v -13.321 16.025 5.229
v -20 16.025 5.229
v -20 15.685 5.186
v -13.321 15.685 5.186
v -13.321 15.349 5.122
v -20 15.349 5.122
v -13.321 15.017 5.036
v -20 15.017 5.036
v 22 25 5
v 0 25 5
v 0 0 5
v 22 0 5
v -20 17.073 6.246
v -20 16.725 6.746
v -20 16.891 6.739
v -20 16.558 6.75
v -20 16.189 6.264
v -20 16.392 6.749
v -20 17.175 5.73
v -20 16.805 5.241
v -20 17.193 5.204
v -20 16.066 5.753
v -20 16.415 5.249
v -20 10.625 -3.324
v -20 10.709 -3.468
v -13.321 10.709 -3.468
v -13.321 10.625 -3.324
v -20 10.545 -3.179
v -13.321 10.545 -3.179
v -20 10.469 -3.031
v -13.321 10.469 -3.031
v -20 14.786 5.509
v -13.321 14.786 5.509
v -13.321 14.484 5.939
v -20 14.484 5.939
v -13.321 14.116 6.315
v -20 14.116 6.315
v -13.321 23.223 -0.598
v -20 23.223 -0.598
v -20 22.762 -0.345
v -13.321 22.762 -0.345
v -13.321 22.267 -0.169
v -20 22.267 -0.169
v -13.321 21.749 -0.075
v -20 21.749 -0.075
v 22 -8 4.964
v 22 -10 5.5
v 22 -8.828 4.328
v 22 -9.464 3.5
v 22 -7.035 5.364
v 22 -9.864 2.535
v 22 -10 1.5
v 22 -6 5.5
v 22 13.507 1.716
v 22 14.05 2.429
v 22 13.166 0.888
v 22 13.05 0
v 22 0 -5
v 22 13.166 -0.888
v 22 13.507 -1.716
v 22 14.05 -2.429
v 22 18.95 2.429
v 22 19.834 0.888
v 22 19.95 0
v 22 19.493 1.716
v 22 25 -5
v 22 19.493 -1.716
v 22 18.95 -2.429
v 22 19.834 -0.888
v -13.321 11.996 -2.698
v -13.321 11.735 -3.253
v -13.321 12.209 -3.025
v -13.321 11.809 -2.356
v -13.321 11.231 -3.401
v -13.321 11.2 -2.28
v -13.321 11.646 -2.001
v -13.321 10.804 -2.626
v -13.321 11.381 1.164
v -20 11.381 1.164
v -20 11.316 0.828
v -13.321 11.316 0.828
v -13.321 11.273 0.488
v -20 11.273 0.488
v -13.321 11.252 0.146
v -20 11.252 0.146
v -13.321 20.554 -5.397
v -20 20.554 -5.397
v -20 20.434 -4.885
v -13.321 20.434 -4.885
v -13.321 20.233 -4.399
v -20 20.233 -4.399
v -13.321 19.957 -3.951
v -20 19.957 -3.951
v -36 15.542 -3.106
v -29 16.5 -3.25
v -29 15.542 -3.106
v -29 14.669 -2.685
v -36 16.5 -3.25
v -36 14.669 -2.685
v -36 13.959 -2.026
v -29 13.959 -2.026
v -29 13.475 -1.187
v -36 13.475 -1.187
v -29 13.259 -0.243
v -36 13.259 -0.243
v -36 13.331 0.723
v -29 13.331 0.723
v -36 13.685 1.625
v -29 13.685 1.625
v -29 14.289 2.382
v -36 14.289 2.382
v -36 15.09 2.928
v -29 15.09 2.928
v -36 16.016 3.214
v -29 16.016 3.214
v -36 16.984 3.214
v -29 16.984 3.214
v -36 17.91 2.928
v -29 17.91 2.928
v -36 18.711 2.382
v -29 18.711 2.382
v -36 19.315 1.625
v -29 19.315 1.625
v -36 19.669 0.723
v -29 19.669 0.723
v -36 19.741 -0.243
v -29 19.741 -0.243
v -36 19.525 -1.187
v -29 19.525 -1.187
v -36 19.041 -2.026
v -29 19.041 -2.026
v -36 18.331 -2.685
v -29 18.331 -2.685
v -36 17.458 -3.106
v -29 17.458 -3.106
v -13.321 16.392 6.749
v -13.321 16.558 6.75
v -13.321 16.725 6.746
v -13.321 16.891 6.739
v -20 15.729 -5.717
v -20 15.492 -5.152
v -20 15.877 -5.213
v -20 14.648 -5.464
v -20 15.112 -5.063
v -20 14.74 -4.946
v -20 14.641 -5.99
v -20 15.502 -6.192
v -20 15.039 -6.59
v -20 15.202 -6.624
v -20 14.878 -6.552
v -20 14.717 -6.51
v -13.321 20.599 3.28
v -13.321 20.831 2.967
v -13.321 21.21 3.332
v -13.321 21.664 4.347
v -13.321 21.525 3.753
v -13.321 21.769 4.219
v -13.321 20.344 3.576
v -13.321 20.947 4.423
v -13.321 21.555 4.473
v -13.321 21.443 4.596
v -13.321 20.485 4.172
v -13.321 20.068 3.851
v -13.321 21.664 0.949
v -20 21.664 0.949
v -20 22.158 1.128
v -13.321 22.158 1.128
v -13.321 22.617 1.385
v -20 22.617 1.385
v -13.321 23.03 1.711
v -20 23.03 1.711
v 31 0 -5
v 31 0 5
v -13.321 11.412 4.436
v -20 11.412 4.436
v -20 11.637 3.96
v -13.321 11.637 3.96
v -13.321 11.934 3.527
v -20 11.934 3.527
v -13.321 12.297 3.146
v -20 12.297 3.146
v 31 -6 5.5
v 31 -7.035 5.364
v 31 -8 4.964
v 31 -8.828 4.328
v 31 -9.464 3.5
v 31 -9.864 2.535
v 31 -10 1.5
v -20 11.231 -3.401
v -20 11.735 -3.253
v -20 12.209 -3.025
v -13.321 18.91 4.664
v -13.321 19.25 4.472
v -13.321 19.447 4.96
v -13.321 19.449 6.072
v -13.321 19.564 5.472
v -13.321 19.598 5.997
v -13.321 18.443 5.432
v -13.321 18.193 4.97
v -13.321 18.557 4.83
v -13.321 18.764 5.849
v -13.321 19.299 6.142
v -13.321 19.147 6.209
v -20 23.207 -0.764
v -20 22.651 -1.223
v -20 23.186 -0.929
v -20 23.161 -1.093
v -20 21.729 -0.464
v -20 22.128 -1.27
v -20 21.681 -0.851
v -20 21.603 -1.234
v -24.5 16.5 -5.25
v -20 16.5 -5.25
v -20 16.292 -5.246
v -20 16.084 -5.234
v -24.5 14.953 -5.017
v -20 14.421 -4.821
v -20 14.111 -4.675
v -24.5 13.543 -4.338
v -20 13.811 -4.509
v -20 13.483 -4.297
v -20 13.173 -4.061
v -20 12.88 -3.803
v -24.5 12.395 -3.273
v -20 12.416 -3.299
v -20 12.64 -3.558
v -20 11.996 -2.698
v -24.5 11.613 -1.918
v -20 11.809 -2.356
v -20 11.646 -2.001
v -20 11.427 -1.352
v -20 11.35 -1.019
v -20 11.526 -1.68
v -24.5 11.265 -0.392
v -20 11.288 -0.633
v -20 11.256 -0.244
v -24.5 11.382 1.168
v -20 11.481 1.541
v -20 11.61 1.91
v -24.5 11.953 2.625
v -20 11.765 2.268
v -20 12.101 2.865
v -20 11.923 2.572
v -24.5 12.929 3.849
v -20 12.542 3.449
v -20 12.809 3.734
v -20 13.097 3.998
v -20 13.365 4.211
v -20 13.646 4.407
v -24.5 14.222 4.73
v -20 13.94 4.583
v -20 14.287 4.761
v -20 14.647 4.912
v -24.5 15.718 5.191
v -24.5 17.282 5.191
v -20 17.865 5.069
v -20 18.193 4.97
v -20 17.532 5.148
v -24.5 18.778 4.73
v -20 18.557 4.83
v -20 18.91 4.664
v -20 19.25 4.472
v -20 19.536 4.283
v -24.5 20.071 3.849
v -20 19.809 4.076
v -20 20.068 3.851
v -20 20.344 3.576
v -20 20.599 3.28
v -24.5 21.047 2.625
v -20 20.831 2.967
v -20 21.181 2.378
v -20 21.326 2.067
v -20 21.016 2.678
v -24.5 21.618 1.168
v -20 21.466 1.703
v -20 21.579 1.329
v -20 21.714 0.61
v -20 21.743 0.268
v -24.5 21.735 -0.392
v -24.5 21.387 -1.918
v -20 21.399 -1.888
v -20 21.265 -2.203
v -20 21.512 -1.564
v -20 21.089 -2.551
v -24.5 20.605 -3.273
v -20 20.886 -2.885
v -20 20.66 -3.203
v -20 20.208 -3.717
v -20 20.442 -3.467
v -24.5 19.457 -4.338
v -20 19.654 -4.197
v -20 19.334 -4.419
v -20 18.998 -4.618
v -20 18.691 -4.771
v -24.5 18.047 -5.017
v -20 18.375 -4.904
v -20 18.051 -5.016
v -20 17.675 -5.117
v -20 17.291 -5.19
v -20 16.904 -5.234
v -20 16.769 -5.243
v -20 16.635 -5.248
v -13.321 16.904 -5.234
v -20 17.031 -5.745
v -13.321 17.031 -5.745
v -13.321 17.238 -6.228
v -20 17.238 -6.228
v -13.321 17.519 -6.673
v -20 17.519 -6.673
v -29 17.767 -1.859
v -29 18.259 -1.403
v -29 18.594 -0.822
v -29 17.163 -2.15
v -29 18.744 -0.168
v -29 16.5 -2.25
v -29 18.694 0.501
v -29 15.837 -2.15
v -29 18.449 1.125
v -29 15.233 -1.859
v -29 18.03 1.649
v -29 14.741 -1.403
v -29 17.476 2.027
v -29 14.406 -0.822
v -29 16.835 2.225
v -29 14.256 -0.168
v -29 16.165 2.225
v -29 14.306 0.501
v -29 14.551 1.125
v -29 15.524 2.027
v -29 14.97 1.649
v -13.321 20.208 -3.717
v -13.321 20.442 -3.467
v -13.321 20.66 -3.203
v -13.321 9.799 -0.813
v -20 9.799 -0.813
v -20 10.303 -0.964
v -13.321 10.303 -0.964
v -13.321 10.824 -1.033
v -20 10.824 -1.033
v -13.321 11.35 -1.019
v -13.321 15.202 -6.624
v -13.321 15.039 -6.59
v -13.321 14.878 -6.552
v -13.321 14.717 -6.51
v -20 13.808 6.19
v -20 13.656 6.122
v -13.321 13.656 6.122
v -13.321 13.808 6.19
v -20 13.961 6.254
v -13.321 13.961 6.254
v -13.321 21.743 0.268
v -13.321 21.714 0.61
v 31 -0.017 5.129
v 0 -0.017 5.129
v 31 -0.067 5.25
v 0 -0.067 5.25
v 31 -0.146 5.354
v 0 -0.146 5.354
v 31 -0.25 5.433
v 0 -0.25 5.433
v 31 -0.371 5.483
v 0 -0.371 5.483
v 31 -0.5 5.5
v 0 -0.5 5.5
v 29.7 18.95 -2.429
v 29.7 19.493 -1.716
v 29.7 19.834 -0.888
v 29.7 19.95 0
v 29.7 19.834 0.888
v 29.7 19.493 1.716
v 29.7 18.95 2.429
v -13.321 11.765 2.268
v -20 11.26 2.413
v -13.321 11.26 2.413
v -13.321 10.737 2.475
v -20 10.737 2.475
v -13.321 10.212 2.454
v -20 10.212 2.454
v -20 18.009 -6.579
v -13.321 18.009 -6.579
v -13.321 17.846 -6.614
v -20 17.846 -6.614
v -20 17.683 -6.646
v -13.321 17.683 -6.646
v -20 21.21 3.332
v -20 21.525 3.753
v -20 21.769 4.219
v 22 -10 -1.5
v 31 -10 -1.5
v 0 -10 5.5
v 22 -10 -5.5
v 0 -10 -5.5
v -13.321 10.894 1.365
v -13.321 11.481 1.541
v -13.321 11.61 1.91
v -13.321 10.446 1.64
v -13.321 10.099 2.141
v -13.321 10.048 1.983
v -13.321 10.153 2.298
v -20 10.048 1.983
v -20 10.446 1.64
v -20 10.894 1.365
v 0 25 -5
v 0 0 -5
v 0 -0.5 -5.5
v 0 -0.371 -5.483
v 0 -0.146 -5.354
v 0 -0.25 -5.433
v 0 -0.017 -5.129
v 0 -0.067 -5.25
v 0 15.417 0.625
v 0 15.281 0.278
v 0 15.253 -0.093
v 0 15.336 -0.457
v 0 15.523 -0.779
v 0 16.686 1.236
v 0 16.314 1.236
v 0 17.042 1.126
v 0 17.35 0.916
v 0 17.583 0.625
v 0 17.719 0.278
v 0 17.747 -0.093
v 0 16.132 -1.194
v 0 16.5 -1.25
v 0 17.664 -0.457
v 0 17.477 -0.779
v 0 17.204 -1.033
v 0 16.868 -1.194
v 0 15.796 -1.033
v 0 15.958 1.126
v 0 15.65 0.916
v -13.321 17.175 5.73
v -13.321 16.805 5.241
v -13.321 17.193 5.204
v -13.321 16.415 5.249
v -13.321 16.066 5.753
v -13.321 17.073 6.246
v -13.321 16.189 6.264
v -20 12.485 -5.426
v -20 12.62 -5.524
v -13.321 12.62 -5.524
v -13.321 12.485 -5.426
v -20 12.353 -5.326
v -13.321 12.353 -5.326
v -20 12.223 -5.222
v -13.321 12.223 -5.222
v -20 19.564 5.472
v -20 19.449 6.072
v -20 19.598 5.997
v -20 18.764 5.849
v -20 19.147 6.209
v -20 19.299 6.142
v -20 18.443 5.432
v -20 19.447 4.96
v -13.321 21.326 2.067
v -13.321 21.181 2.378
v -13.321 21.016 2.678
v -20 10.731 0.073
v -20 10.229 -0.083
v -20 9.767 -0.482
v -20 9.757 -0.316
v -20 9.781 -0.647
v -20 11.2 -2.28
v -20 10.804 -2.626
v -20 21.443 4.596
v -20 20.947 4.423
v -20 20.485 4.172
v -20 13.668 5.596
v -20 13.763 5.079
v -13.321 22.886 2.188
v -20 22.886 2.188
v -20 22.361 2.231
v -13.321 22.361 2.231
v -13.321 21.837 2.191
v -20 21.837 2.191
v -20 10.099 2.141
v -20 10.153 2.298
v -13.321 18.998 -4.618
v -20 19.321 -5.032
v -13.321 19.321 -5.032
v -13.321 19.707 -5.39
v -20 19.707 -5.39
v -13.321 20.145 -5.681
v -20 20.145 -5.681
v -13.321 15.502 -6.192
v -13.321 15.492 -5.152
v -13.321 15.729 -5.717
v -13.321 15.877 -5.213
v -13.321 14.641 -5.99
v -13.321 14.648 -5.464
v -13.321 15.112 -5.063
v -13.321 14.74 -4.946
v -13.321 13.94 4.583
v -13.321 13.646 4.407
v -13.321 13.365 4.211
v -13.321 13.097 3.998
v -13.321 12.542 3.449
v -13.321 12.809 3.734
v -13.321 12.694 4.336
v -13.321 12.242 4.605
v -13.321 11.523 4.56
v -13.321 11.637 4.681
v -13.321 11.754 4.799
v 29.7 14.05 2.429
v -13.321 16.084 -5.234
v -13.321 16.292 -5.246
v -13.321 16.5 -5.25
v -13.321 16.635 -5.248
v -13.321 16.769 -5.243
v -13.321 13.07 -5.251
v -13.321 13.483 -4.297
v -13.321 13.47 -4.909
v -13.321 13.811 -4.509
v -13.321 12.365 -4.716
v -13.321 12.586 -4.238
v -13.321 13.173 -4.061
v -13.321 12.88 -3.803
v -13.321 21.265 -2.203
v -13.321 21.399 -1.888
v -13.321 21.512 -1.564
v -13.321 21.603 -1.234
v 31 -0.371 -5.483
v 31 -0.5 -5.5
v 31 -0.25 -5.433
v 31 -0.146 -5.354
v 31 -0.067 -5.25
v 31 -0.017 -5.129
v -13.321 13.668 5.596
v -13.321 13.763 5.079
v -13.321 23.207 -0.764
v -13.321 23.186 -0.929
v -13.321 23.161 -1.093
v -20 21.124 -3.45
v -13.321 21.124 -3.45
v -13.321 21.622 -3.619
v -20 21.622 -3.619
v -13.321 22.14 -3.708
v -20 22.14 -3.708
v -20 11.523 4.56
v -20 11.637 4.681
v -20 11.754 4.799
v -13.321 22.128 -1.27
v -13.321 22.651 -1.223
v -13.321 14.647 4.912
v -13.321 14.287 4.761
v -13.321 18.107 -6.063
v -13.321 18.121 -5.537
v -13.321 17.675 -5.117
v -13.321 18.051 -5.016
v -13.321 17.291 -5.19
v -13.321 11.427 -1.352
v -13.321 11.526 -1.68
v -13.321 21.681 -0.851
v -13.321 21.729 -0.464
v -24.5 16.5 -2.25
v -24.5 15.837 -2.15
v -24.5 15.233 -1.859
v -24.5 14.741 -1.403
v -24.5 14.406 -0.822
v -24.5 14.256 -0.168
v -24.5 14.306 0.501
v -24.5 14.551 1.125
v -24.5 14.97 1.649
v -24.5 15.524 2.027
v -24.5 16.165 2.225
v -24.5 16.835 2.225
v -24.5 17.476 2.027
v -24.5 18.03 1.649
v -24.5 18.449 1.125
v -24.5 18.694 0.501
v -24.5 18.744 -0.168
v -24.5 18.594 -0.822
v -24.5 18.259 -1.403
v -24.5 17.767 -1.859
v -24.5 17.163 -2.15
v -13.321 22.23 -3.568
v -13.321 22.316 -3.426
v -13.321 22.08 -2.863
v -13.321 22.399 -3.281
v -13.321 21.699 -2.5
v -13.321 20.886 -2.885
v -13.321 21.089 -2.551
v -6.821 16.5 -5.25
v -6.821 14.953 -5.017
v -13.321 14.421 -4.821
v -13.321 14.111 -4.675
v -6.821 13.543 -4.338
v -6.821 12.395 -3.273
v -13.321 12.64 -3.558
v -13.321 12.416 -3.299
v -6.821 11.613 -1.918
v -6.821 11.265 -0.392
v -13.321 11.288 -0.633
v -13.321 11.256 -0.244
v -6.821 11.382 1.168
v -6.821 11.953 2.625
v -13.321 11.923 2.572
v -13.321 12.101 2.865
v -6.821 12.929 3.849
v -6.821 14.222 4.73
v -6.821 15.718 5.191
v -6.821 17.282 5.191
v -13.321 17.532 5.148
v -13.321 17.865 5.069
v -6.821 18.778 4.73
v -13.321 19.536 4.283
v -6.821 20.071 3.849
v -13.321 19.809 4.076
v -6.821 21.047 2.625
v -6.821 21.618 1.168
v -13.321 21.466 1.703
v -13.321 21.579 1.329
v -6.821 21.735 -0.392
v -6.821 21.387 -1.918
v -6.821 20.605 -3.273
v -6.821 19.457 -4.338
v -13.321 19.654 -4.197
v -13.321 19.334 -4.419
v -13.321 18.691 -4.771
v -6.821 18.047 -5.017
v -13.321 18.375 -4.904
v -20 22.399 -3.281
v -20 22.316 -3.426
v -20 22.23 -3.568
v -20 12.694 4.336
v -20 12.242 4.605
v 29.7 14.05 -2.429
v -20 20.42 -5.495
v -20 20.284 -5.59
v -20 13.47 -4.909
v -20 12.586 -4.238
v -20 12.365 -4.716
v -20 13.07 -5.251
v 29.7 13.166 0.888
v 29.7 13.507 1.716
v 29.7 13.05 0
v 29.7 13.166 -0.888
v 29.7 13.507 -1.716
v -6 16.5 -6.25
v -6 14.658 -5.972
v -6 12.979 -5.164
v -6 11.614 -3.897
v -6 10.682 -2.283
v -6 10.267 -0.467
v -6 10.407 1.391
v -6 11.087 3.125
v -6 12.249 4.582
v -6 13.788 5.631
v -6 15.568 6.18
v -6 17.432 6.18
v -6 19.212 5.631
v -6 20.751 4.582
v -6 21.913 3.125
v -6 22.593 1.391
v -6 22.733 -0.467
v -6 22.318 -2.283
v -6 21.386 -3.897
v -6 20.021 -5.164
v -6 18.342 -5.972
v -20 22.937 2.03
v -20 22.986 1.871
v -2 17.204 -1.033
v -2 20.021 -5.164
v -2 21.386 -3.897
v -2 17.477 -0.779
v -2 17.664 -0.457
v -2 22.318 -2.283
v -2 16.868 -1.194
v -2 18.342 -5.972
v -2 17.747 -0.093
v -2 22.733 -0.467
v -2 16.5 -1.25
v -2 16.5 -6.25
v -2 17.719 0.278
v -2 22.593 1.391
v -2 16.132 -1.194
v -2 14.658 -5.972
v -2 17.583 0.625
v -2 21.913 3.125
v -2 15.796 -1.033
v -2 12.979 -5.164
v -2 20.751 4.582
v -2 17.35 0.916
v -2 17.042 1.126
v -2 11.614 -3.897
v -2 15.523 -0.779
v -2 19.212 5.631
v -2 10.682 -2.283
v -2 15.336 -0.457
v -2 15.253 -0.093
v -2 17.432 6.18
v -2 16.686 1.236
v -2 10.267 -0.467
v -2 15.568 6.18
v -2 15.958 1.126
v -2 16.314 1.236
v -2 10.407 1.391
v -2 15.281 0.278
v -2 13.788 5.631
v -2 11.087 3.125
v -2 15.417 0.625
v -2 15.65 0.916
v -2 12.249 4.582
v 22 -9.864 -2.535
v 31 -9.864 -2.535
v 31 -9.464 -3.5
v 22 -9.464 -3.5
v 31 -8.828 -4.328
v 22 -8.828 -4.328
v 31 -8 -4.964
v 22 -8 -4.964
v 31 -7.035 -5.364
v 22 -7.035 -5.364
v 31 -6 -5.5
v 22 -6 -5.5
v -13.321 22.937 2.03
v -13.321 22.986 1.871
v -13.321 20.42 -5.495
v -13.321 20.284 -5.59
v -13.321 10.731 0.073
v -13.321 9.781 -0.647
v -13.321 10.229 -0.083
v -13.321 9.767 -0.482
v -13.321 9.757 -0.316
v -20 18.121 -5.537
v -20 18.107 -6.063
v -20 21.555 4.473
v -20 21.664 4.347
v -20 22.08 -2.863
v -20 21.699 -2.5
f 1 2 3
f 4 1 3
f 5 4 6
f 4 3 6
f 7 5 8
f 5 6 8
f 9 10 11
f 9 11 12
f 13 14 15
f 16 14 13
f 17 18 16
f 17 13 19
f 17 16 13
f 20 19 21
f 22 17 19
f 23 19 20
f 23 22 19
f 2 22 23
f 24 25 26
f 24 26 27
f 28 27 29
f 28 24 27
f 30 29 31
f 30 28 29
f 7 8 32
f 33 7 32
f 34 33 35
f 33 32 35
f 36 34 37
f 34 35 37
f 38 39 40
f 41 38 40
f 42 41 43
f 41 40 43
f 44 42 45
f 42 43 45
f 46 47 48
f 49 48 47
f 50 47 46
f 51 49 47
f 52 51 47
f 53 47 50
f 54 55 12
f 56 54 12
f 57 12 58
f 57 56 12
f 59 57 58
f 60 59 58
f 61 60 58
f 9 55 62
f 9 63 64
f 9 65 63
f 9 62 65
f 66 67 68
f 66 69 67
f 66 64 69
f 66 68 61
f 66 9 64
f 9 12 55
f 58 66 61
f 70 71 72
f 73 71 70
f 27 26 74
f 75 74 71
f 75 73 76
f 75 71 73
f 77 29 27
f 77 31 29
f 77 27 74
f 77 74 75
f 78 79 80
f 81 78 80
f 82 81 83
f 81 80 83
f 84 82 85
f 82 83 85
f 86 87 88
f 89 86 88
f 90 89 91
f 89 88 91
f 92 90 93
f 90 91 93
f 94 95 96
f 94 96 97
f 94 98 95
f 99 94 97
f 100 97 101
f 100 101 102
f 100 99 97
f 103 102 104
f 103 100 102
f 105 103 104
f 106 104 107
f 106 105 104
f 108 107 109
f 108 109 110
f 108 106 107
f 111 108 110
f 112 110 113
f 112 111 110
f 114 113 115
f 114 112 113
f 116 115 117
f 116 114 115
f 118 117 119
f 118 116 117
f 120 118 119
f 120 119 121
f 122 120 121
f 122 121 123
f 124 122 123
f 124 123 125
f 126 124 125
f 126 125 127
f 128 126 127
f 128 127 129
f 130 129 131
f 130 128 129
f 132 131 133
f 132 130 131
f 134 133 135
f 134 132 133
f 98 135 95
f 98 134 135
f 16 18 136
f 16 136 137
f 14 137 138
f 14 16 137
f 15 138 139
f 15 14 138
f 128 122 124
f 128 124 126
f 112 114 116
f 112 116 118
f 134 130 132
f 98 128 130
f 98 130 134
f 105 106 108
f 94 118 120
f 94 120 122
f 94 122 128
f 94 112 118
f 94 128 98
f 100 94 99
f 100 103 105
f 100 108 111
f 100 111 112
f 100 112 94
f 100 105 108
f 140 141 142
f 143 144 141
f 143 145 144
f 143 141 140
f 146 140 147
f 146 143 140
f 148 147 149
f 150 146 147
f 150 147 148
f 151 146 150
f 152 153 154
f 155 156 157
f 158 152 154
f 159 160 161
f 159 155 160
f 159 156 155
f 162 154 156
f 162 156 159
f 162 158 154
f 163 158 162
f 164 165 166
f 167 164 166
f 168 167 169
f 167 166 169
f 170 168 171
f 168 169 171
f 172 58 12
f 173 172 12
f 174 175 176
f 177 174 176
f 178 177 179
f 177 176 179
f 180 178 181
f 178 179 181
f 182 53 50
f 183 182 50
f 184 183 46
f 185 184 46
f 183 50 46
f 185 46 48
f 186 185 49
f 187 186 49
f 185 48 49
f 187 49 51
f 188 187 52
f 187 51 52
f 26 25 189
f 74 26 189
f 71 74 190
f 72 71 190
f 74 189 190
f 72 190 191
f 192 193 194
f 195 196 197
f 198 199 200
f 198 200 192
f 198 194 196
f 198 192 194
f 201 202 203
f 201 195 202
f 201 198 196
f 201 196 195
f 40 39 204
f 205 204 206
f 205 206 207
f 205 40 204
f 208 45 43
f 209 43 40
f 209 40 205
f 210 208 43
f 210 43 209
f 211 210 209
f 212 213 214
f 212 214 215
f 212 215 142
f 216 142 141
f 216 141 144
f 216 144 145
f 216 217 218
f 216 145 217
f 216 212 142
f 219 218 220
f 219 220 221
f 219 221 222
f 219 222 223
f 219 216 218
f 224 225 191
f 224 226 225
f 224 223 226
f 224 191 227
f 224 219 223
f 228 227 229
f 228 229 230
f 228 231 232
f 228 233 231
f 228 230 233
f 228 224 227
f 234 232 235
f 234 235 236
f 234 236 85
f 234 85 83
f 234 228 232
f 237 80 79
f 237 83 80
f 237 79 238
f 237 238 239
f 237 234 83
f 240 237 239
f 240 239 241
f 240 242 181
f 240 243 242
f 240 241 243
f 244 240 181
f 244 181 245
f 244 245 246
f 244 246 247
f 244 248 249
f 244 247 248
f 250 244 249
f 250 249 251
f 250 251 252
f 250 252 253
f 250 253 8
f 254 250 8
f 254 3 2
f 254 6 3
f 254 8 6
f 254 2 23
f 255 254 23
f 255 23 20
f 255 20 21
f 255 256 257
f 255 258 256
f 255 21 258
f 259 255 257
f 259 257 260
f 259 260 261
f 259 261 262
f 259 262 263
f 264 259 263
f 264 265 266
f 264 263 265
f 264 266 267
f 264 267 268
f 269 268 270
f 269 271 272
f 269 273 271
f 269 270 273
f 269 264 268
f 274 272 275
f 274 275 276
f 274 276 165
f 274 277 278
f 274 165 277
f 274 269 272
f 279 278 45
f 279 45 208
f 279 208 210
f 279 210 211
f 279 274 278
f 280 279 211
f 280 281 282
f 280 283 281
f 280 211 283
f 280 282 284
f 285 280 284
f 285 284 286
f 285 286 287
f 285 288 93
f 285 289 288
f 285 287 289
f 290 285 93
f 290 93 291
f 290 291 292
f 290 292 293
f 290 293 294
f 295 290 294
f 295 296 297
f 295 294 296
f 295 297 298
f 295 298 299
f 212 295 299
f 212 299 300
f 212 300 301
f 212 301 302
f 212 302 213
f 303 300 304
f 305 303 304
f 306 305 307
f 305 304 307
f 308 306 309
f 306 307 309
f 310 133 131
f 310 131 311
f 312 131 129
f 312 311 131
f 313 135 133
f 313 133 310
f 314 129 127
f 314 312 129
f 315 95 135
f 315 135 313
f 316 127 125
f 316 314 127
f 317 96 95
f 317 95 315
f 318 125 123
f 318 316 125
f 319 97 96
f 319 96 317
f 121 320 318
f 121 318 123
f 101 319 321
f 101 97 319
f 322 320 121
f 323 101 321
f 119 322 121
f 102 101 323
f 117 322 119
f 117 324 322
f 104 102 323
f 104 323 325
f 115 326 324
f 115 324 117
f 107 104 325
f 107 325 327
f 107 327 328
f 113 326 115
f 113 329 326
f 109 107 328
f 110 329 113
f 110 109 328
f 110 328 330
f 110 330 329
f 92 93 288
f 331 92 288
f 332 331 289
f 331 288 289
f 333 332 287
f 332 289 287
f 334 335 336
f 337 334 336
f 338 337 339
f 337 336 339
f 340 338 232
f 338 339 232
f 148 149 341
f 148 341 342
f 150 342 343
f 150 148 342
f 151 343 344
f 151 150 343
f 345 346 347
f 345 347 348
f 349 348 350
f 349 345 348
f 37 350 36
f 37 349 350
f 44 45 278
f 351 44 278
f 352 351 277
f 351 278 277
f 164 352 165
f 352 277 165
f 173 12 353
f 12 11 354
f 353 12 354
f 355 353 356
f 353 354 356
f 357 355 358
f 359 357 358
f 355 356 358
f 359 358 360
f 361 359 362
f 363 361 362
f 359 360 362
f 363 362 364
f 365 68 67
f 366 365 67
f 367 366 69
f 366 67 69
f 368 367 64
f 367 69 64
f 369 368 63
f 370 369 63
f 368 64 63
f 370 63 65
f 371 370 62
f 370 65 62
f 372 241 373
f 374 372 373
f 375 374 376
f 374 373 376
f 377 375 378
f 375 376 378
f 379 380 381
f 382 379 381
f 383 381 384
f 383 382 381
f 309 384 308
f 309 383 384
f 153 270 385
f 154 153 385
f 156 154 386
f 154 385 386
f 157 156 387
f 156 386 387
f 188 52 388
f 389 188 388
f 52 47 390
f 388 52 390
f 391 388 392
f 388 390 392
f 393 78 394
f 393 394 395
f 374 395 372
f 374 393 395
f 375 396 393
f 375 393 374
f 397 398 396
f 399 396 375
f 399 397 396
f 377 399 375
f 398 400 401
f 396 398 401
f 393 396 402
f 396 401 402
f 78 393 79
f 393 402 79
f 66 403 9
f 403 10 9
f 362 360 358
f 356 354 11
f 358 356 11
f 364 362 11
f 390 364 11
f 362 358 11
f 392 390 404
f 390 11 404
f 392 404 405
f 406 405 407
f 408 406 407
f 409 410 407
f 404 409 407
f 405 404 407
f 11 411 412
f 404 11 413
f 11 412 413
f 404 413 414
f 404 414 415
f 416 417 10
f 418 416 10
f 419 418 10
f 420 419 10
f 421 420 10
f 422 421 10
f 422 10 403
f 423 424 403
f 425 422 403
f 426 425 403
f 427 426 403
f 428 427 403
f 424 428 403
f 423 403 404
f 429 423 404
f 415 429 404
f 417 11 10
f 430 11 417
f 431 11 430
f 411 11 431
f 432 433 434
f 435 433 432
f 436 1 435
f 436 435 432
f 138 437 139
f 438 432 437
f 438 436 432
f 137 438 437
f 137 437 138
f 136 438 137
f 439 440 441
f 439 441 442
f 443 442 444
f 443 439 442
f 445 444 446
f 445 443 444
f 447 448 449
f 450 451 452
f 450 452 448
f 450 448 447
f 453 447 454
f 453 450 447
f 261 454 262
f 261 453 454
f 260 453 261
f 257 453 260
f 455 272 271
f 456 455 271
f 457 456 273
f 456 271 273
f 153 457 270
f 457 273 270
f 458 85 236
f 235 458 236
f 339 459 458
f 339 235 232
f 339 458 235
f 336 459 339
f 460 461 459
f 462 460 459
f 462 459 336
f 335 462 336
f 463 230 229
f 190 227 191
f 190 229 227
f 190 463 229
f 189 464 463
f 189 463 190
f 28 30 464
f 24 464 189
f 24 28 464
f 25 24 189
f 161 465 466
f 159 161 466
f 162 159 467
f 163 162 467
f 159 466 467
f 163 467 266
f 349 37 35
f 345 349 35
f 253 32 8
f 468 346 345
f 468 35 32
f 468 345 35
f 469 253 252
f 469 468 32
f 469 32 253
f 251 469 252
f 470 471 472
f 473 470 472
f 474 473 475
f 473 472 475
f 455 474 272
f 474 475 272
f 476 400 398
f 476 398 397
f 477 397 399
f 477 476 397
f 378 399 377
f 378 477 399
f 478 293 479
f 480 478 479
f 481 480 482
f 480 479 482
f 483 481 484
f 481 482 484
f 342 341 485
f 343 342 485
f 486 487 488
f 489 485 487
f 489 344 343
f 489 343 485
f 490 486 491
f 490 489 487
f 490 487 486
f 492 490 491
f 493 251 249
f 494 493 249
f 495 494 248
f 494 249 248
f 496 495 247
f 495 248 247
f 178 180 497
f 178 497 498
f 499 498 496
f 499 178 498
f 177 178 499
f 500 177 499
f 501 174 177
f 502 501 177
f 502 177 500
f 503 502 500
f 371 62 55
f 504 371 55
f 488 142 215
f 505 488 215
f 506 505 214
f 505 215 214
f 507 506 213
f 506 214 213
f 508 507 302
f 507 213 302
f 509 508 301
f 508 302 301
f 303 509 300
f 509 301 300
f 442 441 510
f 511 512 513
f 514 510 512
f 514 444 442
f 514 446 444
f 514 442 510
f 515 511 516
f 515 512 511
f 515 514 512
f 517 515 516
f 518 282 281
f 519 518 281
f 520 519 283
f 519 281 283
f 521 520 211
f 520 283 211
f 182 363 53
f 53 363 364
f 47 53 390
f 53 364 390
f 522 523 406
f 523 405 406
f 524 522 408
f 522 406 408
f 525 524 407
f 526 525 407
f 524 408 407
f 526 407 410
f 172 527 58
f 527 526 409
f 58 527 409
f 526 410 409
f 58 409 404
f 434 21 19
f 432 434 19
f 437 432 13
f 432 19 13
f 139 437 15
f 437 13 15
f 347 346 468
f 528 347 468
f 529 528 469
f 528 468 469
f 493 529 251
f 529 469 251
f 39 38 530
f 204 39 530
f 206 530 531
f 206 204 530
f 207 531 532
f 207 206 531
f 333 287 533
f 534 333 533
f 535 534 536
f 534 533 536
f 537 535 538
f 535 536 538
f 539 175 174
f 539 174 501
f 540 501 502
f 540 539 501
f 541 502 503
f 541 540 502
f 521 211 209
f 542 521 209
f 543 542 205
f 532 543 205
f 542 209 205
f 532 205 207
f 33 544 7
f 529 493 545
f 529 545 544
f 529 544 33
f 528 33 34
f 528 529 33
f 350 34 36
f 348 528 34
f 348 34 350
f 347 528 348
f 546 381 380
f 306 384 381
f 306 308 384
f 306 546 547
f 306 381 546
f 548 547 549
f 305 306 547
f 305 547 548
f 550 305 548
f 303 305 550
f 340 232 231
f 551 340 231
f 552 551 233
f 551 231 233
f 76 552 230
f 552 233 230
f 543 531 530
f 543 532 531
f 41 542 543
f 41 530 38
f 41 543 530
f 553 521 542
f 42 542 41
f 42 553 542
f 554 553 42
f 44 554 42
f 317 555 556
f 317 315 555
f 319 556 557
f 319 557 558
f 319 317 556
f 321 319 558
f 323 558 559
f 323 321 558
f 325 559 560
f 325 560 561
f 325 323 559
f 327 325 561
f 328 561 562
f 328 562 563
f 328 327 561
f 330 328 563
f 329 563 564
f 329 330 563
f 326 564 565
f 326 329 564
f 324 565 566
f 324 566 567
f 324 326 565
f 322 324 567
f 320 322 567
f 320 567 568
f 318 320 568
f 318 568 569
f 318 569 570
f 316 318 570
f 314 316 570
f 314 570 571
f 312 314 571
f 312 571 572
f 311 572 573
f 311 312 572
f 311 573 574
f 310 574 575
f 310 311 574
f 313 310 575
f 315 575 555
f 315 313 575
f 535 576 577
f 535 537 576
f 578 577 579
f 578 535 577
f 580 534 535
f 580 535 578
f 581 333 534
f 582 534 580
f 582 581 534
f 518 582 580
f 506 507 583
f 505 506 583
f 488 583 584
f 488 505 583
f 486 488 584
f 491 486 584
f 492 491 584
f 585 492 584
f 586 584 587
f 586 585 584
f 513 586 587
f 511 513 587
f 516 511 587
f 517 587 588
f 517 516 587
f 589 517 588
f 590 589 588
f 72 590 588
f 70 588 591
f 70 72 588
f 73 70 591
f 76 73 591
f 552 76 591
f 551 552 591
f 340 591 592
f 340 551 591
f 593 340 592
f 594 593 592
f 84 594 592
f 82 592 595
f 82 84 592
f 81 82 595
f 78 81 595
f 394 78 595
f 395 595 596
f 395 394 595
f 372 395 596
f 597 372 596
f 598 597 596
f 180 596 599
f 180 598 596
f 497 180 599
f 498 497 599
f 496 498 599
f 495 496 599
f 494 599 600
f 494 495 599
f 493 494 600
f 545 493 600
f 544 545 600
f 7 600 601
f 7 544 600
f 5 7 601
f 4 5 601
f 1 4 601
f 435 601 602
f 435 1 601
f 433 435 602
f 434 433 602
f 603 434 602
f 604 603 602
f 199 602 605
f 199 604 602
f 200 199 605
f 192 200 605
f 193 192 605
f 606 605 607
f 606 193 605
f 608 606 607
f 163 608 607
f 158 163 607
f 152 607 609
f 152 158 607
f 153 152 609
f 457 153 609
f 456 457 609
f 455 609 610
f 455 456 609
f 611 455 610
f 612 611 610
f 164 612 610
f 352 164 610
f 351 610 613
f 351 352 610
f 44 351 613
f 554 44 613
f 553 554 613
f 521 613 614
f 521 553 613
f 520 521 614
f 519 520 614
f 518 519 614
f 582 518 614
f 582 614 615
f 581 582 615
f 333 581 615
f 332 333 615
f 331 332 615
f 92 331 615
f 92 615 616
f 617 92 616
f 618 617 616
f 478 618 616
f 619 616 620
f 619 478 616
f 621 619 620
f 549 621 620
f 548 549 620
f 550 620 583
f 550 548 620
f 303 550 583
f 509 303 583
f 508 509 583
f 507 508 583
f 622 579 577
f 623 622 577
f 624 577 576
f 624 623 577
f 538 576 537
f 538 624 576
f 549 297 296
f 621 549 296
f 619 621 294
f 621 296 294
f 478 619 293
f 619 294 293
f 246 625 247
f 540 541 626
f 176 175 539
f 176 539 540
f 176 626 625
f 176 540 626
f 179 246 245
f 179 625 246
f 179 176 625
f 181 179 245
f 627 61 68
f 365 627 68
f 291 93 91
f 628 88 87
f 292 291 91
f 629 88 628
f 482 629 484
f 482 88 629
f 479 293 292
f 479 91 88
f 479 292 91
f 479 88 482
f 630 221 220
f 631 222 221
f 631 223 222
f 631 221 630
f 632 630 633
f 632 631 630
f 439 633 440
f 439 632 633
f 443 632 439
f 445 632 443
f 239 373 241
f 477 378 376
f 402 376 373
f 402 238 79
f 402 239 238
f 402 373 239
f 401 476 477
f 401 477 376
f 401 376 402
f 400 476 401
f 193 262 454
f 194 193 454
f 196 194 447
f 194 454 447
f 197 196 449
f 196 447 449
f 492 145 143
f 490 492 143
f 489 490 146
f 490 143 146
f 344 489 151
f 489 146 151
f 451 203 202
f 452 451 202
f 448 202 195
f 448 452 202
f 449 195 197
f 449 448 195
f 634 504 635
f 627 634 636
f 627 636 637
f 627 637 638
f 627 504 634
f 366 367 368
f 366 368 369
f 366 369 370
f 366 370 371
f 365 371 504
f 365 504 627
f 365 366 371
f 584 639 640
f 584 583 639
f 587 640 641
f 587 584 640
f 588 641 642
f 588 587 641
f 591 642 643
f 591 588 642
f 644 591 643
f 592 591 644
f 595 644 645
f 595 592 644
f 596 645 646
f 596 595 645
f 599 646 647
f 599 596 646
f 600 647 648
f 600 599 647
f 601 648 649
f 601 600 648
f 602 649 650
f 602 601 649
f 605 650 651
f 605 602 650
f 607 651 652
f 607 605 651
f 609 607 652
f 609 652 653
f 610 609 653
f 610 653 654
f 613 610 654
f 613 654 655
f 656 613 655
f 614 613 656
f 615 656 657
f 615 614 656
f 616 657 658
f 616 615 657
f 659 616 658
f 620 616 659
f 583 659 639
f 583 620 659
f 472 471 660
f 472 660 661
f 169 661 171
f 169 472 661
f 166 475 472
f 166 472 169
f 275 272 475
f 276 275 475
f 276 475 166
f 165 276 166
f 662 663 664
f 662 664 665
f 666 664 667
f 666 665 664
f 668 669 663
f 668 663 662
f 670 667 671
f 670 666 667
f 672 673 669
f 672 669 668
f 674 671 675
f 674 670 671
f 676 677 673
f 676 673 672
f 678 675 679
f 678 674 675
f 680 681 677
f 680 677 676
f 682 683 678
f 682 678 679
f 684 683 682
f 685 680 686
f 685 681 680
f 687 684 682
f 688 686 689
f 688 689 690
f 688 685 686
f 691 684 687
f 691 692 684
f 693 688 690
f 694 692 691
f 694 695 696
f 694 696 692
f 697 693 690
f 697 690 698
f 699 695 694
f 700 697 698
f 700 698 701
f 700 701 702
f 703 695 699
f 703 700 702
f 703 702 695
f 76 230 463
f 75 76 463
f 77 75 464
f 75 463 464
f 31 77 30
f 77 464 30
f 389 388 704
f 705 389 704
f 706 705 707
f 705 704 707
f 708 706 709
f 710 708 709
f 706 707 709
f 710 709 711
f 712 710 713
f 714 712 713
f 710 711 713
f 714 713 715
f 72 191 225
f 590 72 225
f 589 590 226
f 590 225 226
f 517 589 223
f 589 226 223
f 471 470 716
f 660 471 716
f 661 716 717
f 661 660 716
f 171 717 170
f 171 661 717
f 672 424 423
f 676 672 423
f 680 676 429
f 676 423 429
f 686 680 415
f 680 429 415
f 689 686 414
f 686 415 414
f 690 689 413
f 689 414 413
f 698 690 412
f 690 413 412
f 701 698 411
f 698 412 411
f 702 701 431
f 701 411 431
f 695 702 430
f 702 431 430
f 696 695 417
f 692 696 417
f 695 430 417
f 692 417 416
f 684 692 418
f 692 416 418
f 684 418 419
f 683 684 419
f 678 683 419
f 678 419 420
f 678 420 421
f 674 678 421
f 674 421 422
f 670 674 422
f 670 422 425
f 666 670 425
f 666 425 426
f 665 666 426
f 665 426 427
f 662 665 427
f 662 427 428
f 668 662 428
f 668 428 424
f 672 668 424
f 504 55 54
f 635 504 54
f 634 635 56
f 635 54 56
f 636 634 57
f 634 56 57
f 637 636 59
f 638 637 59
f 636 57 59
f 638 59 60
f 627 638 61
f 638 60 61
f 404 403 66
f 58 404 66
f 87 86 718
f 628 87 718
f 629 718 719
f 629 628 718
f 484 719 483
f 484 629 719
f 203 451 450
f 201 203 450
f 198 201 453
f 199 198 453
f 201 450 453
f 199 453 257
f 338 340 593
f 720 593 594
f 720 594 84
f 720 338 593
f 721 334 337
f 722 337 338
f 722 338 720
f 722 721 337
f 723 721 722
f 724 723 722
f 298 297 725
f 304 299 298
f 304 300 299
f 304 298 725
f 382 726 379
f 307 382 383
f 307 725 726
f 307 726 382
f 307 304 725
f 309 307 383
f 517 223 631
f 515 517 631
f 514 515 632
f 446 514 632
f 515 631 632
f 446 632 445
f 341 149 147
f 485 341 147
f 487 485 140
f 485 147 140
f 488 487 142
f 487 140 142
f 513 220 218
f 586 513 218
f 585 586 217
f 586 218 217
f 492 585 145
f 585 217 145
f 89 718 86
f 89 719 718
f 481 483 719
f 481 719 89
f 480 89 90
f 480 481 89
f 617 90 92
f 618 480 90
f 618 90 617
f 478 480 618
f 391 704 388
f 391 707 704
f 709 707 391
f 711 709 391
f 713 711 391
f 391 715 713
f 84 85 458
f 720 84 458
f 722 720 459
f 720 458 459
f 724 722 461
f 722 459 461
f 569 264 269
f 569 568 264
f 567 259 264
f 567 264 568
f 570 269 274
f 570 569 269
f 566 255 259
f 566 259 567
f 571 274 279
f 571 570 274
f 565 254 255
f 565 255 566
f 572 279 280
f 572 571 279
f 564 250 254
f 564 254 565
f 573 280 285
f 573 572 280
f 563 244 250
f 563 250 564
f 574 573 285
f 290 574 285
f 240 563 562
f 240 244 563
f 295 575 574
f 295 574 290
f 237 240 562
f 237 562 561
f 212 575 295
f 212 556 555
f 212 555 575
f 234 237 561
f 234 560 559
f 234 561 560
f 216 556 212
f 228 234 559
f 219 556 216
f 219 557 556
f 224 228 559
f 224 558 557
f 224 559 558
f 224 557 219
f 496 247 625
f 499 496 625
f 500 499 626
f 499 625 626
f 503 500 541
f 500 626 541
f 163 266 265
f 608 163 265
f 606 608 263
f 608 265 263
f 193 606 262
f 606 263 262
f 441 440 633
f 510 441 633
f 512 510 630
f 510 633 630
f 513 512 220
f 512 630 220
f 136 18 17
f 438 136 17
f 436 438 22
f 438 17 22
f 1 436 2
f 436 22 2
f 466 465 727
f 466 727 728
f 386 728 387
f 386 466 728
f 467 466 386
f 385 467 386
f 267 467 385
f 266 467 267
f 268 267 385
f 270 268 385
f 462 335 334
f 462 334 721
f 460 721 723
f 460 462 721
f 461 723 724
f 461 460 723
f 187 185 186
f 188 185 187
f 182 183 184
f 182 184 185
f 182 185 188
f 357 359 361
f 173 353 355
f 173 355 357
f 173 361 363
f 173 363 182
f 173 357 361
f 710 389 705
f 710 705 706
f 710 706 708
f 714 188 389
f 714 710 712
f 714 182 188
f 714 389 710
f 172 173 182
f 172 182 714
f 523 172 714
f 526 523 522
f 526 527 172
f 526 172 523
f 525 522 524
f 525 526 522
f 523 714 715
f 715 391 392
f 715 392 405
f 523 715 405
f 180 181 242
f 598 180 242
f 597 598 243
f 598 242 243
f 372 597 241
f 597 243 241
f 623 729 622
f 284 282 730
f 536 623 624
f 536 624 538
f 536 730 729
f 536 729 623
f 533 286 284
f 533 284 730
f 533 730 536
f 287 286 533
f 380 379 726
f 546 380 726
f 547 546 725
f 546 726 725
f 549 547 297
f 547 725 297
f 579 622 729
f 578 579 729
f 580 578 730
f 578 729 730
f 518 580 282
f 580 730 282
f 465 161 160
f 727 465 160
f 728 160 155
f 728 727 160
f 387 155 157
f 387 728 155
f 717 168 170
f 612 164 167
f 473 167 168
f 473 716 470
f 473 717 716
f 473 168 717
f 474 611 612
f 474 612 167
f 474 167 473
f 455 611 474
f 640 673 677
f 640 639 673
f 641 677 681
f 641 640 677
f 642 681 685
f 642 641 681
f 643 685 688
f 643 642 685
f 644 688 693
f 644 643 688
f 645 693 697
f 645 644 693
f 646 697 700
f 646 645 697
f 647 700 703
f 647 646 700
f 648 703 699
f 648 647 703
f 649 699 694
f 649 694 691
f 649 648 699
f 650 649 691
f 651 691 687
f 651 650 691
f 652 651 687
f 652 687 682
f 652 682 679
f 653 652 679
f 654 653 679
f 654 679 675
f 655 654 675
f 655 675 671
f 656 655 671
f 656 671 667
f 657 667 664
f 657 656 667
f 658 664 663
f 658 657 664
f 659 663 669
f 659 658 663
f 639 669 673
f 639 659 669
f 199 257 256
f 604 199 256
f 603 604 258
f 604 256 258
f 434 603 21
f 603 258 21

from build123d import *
from build123d.topology import SkipClean

# Parameters (mm, degrees)
ESQUISSE1_W             = 22
ESQUISSE1_H             = 25
EXTRUSION1_DEPTH        = 5
EXTRUSION2_DEPTH        = 22
EXTRUSION3_DEPTH        = 9
EXTRUSION4_DEPTH        = 7.7
ESQUISSE6_R             = 1.25
EXTRUSION5_DEPTH        = 36
ENL_V_MAT_EXTRU_2_DEPTH = 6.678544503


with BuildPart() as part:
    # Esquisse1 → Extrusion1 (new, symmetric)
    with BuildSketch(Plane.XY):
        with Locations((11, 12.5)):
            Rectangle(ESQUISSE1_W, ESQUISSE1_H)
    extrude(amount=EXTRUSION1_DEPTH, both=True)

    # Esquisse2 → Extrusion2 (add)
    with BuildSketch(Plane.ZY):
        with BuildLine():
            Line((-5, 0), (5, 0))
            ThreePointArc((5, 0), (5.353553391, -0.146446609), (5.5, -0.5))
            Line((5.5, -0.5), (5.5, -10))
            Line((5.5, -10), (-5.5, -10))
            Line((-5.5, -10), (-5.5, -0.5))
            ThreePointArc((-5.5, -0.5), (-5.353553391, -0.146446609), (-5, 0))
        make_face()
    extrude(amount=-EXTRUSION2_DEPTH)

    # Esquisse4 → Extrusion3 (add)
    with BuildSketch(Plane(origin=(22, 0, 0), x_dir=(0, 0, -1), z_dir=(1, 0, 0))):
        with BuildLine():
            Line((5.5, -6), (5.5, -0.5))
            ThreePointArc((5.5, -0.5), (5.353553391, -0.146446609), (5, 0))
            Line((5, 0), (-5, 0))
            ThreePointArc((-5, 0), (-5.353553391, -0.146446609), (-5.5, -0.5))
            Line((-5.5, -0.5), (-5.5, -6))
            ThreePointArc((-5.5, -6), (-4.328427125, -8.828427125), (-1.5, -10))
            Line((-1.5, -10), (1.5, -10))
            ThreePointArc((1.5, -10), (4.328427125, -8.828427125), (5.5, -6))
        make_face()
    extrude(amount=EXTRUSION3_DEPTH)

    # Esquisse5 → Extrusion4 (add)
    with BuildSketch(Plane(origin=(22, 0, 0), x_dir=(0, 0, -1), z_dir=(1, 0, 0))):
        with BuildLine():
            Line((-2.42899156, 18.95), (-2.42899156, 14.05))
            ThreePointArc((-2.42899156, 14.05), (0, 13.05), (2.42899156, 14.05))
            Line((2.42899156, 14.05), (2.42899156, 18.95))
            ThreePointArc((2.42899156, 18.95), (0, 19.95), (-2.42899156, 18.95))
        make_face()
    extrude(amount=EXTRUSION4_DEPTH)

    # Esquisse6 → Extrusion5 (add)
    with BuildSketch(Plane.ZY):
        with Locations(Location((0, 16.5, 0), (0, 0, 180))):
            Circle(ESQUISSE6_R)
    extrude(amount=EXTRUSION5_DEPTH)

    # Esquisse7 → Révolution1 (revolve)
    with BuildSketch(Plane.XY, mode=Mode.PRIVATE) as r_volution1_sk:
        Polygon((-2, 17.75), (-2, 22.75), (-6, 22.75), (-6.821455497, 21.75), (-13.321455497, 21.75), (-13.321455497, 23.25), (-20, 23.25), (-20, 21.75), (-24.5, 21.75), (-24.5, 18.75), (-29, 18.75), (-29, 19.75), (-36, 19.75), (-36, 17.75), align=None)
    revolve(r_volution1_sk.sketch.rotate(Axis((0, 16.5, 0), (-1, 0, 0)), 90), axis=Axis((0, 16.5, 0), (-1, 0, 0)))

    # Esquisse8 → Enlèv. mat.-Extru.2 (cut)
    with SkipClean():  # the faces are left unmerged after this step: merging them gives an invalid solid
        with BuildSketch(Plane.ZY.offset(20)):
            with BuildLine():
                ThreePointArc((-3.202562433, 20.660059358), (-3.544451524, 21.369801094), (-3.707751714, 22.140485549))
                ThreePointArc((-3.707751714, 22.140485549), (-4.620864959, 21.420376716), (-5.396827126, 20.554227049))
                ThreePointArc((-5.396827126, 20.554227049), (-4.63790237, 20.342910474), (-3.951001573, 19.957178991))
                ThreePointArc((-3.951001573, 19.957178991), (-3.594006079, 20.326959668), (-3.202562433, 20.660059358))
            make_face()
            with BuildLine():
                ThreePointArc((-1.233637785, 21.603002823), (-1.25729104, 22.390442983), (-1.093007579, 23.160918438))
                ThreePointArc((-1.093007579, 23.160918438), (-2.220072686, 22.874462901), (-3.281244207, 22.398808054))
                ThreePointArc((-3.281244207, 22.398808054), (-2.673882137, 21.897078248), (-2.203258163, 21.26530728))
                ThreePointArc((-2.203258163, 21.26530728), (-1.7267232, 21.457915589), (-1.233637785, 21.603002823))
            make_face()
            with BuildLine():
                ThreePointArc((0.948594043, 21.663590741), (1.247266486, 22.392573768), (1.710727497, 23.029618016))
                ThreePointArc((1.710727497, 23.029618016), (0.564590324, 23.226346539), (-0.598304355, 23.223431557))
                ThreePointArc((-0.598304355, 23.223431557), (-0.247523392, 22.518042162), (-0.0745514, 21.749470648))
                ThreePointArc((-0.0745514, 21.749470648), (0.439125807, 21.731602864), (0.948594043, 21.663590741))
            make_face()
            with BuildLine():
                ThreePointArc((4.218662246, 21.769287319), (3.251630537, 22.415183754), (2.188087756, 22.885512663))
                ThreePointArc((2.188087756, 22.885512663), (2.221634397, 22.098431915), (2.067045976, 21.325952852))
                ThreePointArc((2.067045976, 21.325952852), (2.529045974, 21.100698476), (2.966805343, 20.83134691))
                ThreePointArc((2.966805343, 20.83134691), (3.536160307, 21.375825016), (4.218662246, 21.769287319))
            make_face()
            with BuildLine():
                ThreePointArc((5.997151968, 19.597848975), (5.376434291, 20.581231961), (4.596139615, 21.44348062))
                ThreePointArc((4.596139615, 21.44348062), (4.306651415, 20.710801929), (3.851232325, 20.067983966))
                ThreePointArc((3.851232325, 20.067983966), (4.181671115, 19.674291525), (4.472029047, 19.250173849))
                ThreePointArc((4.472029047, 19.250173849), (5.213619885, 19.516001823), (5.997151968, 19.597848975))
            make_face()
            with BuildLine():
                ThreePointArc((6.738679632, 16.8907644), (6.571603712, 18.041598084), (6.209477181, 19.146675867))
                ThreePointArc((6.209477181, 19.146675867), (5.647009279, 18.595086036), (4.969505618, 18.193078237))
                ThreePointArc((4.969505618, 18.193078237), (5.111247332, 17.699020732), (5.203998302, 17.193470745))
                ThreePointArc((5.203998302, 17.193470745), (5.98959722, 17.134684515), (6.738679632, 16.8907644))
            make_face()
            with BuildLine():
                ThreePointArc((6.315028369, 14.116113111), (6.63048315, 15.235407894), (6.74913973, 16.392236812))
                ThreePointArc((6.74913973, 16.392236812), (6.010947937, 16.117110733), (5.228506242, 16.0254239))
                ThreePointArc((5.228506242, 16.0254239), (5.15704245, 15.516428362), (5.036148973, 15.016860249))
                ThreePointArc((5.036148973, 15.016860249), (5.729918783, 14.643624489), (6.315028369, 14.116113111))
            make_face()
            with BuildLine():
                ThreePointArc((4.79945133, 11.753657521), (5.542891816, 12.647877167), (6.121814706, 13.656430992))
                ThreePointArc((6.121814706, 13.656430992), (5.335539089, 13.705340464), (4.583450638, 13.939828082))
                ThreePointArc((4.583450638, 13.939828082), (4.311138079, 13.503904463), (3.997503735, 13.09669809))
                ThreePointArc((3.997503735, 13.09669809), (4.479485333, 12.473548654), (4.79945133, 11.753657521))
            make_face()
            with BuildLine():
                ThreePointArc((2.454005555, 10.211887665), (3.496884131, 10.726413474), (4.435972305, 11.412304086))
                ThreePointArc((4.435972305, 11.412304086), (3.737567061, 11.776792217), (3.145874779, 12.296909248))
                ThreePointArc((3.145874779, 12.296909248), (2.719798768, 12.009432702), (2.267653785, 11.76499775))
                ThreePointArc((2.267653785, 11.76499775), (2.454508175, 10.999682835), (2.454005555, 10.211887665))
            make_face()
            with BuildLine():
                ThreePointArc((-4.617734942, 18.997803837), (-5.218744139, 19.507126354), (-5.681391894, 20.144761467))
                ThreePointArc((-5.681391894, 20.144761467), (-6.222667702, 19.115512697), (-6.579249607, 18.008633356))
                ThreePointArc((-6.579249607, 18.008633356), (-5.799987148, 18.124268567), (-5.015580917, 18.051273047))
                ThreePointArc((-5.015580917, 18.051273047), (-4.839852657, 18.534287653), (-4.617734942, 18.997803837))
            make_face()
            with BuildLine():
                ThreePointArc((-5.234459128, 16.90365534), (-5.990668481, 17.124492149), (-6.672667801, 17.518825015))
                ThreePointArc((-6.672667801, 17.518825015), (-6.748514668, 16.358402772), (-6.624060061, 15.202183251))
                ThreePointArc((-6.624060061, 15.202183251), (-5.959201458, 15.624775868), (-5.212920756, 15.8771379))
                ThreePointArc((-5.212920756, 15.8771379), (-5.248844742, 16.389868823), (-5.234459128, 16.90365534))
            make_face()
            with BuildLine():
                ThreePointArc((-4.946097778, 14.739711168), (-5.72675182, 14.633877579), (-6.510178827, 14.716724463))
                ThreePointArc((-6.510178827, 14.716724463), (-6.10748214, 13.625776294), (-5.523510351, 12.620137451))
                ThreePointArc((-5.523510351, 12.620137451), (-5.088015698, 13.276617374), (-4.508899238, 13.810701269))
                ThreePointArc((-4.508899238, 13.810701269), (-4.750263886, 14.264492673), (-4.946097778, 14.739711168))
            make_face()
            with BuildLine():
                ThreePointArc((-2.001435869, 11.646469897), (-2.445145697, 10.995514391), (-3.030927918, 10.46875005))
                ThreePointArc((-3.030927918, 10.46875005), (-1.950738753, 10.0380252), (-0.812650054, 9.799097084))
                ThreePointArc((-0.812650054, 9.799097084), (-1.00910691, 10.562003491), (-1.018504045, 11.349742772))
                ThreePointArc((-1.018504045, 11.349742772), (-1.517241252, 11.4740196), (-2.001435869, 11.646469897))
            make_face()
            with BuildLine():
                ThreePointArc((-0.315760074, 9.757389558), (0.846233411, 9.803255342), (1.983109992, 10.047886024))
                ThreePointArc((1.983109992, 10.047886024), (1.493335733, 10.664929505), (1.164348592, 11.380742988))
                ThreePointArc((1.164348592, 11.380742988), (0.658181542, 11.291420822), (0.145705895, 11.252022314))
                ThreePointArc((0.145705895, 11.252022314), (0.005124254, 10.476871823), (-0.315760074, 9.757389558))
            make_face()
            with BuildLine():
                ThreePointArc((-3.802511188, 12.880136927), (-4.472627743, 12.465932528), (-5.22202079, 12.222968452))
                ThreePointArc((-5.22202079, 12.222968452), (-4.410410464, 11.390129206), (-3.467895523, 10.708955134))
                ThreePointArc((-3.467895523, 10.708955134), (-3.3370658, 11.485811019), (-3.02524808, 12.20926882))
                ThreePointArc((-3.02524808, 12.20926882), (-3.43031925, 12.525656049), (-3.802511188, 12.880136927))
            make_face()
        extrude(amount=-ENL_V_MAT_EXTRU_2_DEPTH, mode=Mode.SUBTRACT)


solid = part.part
